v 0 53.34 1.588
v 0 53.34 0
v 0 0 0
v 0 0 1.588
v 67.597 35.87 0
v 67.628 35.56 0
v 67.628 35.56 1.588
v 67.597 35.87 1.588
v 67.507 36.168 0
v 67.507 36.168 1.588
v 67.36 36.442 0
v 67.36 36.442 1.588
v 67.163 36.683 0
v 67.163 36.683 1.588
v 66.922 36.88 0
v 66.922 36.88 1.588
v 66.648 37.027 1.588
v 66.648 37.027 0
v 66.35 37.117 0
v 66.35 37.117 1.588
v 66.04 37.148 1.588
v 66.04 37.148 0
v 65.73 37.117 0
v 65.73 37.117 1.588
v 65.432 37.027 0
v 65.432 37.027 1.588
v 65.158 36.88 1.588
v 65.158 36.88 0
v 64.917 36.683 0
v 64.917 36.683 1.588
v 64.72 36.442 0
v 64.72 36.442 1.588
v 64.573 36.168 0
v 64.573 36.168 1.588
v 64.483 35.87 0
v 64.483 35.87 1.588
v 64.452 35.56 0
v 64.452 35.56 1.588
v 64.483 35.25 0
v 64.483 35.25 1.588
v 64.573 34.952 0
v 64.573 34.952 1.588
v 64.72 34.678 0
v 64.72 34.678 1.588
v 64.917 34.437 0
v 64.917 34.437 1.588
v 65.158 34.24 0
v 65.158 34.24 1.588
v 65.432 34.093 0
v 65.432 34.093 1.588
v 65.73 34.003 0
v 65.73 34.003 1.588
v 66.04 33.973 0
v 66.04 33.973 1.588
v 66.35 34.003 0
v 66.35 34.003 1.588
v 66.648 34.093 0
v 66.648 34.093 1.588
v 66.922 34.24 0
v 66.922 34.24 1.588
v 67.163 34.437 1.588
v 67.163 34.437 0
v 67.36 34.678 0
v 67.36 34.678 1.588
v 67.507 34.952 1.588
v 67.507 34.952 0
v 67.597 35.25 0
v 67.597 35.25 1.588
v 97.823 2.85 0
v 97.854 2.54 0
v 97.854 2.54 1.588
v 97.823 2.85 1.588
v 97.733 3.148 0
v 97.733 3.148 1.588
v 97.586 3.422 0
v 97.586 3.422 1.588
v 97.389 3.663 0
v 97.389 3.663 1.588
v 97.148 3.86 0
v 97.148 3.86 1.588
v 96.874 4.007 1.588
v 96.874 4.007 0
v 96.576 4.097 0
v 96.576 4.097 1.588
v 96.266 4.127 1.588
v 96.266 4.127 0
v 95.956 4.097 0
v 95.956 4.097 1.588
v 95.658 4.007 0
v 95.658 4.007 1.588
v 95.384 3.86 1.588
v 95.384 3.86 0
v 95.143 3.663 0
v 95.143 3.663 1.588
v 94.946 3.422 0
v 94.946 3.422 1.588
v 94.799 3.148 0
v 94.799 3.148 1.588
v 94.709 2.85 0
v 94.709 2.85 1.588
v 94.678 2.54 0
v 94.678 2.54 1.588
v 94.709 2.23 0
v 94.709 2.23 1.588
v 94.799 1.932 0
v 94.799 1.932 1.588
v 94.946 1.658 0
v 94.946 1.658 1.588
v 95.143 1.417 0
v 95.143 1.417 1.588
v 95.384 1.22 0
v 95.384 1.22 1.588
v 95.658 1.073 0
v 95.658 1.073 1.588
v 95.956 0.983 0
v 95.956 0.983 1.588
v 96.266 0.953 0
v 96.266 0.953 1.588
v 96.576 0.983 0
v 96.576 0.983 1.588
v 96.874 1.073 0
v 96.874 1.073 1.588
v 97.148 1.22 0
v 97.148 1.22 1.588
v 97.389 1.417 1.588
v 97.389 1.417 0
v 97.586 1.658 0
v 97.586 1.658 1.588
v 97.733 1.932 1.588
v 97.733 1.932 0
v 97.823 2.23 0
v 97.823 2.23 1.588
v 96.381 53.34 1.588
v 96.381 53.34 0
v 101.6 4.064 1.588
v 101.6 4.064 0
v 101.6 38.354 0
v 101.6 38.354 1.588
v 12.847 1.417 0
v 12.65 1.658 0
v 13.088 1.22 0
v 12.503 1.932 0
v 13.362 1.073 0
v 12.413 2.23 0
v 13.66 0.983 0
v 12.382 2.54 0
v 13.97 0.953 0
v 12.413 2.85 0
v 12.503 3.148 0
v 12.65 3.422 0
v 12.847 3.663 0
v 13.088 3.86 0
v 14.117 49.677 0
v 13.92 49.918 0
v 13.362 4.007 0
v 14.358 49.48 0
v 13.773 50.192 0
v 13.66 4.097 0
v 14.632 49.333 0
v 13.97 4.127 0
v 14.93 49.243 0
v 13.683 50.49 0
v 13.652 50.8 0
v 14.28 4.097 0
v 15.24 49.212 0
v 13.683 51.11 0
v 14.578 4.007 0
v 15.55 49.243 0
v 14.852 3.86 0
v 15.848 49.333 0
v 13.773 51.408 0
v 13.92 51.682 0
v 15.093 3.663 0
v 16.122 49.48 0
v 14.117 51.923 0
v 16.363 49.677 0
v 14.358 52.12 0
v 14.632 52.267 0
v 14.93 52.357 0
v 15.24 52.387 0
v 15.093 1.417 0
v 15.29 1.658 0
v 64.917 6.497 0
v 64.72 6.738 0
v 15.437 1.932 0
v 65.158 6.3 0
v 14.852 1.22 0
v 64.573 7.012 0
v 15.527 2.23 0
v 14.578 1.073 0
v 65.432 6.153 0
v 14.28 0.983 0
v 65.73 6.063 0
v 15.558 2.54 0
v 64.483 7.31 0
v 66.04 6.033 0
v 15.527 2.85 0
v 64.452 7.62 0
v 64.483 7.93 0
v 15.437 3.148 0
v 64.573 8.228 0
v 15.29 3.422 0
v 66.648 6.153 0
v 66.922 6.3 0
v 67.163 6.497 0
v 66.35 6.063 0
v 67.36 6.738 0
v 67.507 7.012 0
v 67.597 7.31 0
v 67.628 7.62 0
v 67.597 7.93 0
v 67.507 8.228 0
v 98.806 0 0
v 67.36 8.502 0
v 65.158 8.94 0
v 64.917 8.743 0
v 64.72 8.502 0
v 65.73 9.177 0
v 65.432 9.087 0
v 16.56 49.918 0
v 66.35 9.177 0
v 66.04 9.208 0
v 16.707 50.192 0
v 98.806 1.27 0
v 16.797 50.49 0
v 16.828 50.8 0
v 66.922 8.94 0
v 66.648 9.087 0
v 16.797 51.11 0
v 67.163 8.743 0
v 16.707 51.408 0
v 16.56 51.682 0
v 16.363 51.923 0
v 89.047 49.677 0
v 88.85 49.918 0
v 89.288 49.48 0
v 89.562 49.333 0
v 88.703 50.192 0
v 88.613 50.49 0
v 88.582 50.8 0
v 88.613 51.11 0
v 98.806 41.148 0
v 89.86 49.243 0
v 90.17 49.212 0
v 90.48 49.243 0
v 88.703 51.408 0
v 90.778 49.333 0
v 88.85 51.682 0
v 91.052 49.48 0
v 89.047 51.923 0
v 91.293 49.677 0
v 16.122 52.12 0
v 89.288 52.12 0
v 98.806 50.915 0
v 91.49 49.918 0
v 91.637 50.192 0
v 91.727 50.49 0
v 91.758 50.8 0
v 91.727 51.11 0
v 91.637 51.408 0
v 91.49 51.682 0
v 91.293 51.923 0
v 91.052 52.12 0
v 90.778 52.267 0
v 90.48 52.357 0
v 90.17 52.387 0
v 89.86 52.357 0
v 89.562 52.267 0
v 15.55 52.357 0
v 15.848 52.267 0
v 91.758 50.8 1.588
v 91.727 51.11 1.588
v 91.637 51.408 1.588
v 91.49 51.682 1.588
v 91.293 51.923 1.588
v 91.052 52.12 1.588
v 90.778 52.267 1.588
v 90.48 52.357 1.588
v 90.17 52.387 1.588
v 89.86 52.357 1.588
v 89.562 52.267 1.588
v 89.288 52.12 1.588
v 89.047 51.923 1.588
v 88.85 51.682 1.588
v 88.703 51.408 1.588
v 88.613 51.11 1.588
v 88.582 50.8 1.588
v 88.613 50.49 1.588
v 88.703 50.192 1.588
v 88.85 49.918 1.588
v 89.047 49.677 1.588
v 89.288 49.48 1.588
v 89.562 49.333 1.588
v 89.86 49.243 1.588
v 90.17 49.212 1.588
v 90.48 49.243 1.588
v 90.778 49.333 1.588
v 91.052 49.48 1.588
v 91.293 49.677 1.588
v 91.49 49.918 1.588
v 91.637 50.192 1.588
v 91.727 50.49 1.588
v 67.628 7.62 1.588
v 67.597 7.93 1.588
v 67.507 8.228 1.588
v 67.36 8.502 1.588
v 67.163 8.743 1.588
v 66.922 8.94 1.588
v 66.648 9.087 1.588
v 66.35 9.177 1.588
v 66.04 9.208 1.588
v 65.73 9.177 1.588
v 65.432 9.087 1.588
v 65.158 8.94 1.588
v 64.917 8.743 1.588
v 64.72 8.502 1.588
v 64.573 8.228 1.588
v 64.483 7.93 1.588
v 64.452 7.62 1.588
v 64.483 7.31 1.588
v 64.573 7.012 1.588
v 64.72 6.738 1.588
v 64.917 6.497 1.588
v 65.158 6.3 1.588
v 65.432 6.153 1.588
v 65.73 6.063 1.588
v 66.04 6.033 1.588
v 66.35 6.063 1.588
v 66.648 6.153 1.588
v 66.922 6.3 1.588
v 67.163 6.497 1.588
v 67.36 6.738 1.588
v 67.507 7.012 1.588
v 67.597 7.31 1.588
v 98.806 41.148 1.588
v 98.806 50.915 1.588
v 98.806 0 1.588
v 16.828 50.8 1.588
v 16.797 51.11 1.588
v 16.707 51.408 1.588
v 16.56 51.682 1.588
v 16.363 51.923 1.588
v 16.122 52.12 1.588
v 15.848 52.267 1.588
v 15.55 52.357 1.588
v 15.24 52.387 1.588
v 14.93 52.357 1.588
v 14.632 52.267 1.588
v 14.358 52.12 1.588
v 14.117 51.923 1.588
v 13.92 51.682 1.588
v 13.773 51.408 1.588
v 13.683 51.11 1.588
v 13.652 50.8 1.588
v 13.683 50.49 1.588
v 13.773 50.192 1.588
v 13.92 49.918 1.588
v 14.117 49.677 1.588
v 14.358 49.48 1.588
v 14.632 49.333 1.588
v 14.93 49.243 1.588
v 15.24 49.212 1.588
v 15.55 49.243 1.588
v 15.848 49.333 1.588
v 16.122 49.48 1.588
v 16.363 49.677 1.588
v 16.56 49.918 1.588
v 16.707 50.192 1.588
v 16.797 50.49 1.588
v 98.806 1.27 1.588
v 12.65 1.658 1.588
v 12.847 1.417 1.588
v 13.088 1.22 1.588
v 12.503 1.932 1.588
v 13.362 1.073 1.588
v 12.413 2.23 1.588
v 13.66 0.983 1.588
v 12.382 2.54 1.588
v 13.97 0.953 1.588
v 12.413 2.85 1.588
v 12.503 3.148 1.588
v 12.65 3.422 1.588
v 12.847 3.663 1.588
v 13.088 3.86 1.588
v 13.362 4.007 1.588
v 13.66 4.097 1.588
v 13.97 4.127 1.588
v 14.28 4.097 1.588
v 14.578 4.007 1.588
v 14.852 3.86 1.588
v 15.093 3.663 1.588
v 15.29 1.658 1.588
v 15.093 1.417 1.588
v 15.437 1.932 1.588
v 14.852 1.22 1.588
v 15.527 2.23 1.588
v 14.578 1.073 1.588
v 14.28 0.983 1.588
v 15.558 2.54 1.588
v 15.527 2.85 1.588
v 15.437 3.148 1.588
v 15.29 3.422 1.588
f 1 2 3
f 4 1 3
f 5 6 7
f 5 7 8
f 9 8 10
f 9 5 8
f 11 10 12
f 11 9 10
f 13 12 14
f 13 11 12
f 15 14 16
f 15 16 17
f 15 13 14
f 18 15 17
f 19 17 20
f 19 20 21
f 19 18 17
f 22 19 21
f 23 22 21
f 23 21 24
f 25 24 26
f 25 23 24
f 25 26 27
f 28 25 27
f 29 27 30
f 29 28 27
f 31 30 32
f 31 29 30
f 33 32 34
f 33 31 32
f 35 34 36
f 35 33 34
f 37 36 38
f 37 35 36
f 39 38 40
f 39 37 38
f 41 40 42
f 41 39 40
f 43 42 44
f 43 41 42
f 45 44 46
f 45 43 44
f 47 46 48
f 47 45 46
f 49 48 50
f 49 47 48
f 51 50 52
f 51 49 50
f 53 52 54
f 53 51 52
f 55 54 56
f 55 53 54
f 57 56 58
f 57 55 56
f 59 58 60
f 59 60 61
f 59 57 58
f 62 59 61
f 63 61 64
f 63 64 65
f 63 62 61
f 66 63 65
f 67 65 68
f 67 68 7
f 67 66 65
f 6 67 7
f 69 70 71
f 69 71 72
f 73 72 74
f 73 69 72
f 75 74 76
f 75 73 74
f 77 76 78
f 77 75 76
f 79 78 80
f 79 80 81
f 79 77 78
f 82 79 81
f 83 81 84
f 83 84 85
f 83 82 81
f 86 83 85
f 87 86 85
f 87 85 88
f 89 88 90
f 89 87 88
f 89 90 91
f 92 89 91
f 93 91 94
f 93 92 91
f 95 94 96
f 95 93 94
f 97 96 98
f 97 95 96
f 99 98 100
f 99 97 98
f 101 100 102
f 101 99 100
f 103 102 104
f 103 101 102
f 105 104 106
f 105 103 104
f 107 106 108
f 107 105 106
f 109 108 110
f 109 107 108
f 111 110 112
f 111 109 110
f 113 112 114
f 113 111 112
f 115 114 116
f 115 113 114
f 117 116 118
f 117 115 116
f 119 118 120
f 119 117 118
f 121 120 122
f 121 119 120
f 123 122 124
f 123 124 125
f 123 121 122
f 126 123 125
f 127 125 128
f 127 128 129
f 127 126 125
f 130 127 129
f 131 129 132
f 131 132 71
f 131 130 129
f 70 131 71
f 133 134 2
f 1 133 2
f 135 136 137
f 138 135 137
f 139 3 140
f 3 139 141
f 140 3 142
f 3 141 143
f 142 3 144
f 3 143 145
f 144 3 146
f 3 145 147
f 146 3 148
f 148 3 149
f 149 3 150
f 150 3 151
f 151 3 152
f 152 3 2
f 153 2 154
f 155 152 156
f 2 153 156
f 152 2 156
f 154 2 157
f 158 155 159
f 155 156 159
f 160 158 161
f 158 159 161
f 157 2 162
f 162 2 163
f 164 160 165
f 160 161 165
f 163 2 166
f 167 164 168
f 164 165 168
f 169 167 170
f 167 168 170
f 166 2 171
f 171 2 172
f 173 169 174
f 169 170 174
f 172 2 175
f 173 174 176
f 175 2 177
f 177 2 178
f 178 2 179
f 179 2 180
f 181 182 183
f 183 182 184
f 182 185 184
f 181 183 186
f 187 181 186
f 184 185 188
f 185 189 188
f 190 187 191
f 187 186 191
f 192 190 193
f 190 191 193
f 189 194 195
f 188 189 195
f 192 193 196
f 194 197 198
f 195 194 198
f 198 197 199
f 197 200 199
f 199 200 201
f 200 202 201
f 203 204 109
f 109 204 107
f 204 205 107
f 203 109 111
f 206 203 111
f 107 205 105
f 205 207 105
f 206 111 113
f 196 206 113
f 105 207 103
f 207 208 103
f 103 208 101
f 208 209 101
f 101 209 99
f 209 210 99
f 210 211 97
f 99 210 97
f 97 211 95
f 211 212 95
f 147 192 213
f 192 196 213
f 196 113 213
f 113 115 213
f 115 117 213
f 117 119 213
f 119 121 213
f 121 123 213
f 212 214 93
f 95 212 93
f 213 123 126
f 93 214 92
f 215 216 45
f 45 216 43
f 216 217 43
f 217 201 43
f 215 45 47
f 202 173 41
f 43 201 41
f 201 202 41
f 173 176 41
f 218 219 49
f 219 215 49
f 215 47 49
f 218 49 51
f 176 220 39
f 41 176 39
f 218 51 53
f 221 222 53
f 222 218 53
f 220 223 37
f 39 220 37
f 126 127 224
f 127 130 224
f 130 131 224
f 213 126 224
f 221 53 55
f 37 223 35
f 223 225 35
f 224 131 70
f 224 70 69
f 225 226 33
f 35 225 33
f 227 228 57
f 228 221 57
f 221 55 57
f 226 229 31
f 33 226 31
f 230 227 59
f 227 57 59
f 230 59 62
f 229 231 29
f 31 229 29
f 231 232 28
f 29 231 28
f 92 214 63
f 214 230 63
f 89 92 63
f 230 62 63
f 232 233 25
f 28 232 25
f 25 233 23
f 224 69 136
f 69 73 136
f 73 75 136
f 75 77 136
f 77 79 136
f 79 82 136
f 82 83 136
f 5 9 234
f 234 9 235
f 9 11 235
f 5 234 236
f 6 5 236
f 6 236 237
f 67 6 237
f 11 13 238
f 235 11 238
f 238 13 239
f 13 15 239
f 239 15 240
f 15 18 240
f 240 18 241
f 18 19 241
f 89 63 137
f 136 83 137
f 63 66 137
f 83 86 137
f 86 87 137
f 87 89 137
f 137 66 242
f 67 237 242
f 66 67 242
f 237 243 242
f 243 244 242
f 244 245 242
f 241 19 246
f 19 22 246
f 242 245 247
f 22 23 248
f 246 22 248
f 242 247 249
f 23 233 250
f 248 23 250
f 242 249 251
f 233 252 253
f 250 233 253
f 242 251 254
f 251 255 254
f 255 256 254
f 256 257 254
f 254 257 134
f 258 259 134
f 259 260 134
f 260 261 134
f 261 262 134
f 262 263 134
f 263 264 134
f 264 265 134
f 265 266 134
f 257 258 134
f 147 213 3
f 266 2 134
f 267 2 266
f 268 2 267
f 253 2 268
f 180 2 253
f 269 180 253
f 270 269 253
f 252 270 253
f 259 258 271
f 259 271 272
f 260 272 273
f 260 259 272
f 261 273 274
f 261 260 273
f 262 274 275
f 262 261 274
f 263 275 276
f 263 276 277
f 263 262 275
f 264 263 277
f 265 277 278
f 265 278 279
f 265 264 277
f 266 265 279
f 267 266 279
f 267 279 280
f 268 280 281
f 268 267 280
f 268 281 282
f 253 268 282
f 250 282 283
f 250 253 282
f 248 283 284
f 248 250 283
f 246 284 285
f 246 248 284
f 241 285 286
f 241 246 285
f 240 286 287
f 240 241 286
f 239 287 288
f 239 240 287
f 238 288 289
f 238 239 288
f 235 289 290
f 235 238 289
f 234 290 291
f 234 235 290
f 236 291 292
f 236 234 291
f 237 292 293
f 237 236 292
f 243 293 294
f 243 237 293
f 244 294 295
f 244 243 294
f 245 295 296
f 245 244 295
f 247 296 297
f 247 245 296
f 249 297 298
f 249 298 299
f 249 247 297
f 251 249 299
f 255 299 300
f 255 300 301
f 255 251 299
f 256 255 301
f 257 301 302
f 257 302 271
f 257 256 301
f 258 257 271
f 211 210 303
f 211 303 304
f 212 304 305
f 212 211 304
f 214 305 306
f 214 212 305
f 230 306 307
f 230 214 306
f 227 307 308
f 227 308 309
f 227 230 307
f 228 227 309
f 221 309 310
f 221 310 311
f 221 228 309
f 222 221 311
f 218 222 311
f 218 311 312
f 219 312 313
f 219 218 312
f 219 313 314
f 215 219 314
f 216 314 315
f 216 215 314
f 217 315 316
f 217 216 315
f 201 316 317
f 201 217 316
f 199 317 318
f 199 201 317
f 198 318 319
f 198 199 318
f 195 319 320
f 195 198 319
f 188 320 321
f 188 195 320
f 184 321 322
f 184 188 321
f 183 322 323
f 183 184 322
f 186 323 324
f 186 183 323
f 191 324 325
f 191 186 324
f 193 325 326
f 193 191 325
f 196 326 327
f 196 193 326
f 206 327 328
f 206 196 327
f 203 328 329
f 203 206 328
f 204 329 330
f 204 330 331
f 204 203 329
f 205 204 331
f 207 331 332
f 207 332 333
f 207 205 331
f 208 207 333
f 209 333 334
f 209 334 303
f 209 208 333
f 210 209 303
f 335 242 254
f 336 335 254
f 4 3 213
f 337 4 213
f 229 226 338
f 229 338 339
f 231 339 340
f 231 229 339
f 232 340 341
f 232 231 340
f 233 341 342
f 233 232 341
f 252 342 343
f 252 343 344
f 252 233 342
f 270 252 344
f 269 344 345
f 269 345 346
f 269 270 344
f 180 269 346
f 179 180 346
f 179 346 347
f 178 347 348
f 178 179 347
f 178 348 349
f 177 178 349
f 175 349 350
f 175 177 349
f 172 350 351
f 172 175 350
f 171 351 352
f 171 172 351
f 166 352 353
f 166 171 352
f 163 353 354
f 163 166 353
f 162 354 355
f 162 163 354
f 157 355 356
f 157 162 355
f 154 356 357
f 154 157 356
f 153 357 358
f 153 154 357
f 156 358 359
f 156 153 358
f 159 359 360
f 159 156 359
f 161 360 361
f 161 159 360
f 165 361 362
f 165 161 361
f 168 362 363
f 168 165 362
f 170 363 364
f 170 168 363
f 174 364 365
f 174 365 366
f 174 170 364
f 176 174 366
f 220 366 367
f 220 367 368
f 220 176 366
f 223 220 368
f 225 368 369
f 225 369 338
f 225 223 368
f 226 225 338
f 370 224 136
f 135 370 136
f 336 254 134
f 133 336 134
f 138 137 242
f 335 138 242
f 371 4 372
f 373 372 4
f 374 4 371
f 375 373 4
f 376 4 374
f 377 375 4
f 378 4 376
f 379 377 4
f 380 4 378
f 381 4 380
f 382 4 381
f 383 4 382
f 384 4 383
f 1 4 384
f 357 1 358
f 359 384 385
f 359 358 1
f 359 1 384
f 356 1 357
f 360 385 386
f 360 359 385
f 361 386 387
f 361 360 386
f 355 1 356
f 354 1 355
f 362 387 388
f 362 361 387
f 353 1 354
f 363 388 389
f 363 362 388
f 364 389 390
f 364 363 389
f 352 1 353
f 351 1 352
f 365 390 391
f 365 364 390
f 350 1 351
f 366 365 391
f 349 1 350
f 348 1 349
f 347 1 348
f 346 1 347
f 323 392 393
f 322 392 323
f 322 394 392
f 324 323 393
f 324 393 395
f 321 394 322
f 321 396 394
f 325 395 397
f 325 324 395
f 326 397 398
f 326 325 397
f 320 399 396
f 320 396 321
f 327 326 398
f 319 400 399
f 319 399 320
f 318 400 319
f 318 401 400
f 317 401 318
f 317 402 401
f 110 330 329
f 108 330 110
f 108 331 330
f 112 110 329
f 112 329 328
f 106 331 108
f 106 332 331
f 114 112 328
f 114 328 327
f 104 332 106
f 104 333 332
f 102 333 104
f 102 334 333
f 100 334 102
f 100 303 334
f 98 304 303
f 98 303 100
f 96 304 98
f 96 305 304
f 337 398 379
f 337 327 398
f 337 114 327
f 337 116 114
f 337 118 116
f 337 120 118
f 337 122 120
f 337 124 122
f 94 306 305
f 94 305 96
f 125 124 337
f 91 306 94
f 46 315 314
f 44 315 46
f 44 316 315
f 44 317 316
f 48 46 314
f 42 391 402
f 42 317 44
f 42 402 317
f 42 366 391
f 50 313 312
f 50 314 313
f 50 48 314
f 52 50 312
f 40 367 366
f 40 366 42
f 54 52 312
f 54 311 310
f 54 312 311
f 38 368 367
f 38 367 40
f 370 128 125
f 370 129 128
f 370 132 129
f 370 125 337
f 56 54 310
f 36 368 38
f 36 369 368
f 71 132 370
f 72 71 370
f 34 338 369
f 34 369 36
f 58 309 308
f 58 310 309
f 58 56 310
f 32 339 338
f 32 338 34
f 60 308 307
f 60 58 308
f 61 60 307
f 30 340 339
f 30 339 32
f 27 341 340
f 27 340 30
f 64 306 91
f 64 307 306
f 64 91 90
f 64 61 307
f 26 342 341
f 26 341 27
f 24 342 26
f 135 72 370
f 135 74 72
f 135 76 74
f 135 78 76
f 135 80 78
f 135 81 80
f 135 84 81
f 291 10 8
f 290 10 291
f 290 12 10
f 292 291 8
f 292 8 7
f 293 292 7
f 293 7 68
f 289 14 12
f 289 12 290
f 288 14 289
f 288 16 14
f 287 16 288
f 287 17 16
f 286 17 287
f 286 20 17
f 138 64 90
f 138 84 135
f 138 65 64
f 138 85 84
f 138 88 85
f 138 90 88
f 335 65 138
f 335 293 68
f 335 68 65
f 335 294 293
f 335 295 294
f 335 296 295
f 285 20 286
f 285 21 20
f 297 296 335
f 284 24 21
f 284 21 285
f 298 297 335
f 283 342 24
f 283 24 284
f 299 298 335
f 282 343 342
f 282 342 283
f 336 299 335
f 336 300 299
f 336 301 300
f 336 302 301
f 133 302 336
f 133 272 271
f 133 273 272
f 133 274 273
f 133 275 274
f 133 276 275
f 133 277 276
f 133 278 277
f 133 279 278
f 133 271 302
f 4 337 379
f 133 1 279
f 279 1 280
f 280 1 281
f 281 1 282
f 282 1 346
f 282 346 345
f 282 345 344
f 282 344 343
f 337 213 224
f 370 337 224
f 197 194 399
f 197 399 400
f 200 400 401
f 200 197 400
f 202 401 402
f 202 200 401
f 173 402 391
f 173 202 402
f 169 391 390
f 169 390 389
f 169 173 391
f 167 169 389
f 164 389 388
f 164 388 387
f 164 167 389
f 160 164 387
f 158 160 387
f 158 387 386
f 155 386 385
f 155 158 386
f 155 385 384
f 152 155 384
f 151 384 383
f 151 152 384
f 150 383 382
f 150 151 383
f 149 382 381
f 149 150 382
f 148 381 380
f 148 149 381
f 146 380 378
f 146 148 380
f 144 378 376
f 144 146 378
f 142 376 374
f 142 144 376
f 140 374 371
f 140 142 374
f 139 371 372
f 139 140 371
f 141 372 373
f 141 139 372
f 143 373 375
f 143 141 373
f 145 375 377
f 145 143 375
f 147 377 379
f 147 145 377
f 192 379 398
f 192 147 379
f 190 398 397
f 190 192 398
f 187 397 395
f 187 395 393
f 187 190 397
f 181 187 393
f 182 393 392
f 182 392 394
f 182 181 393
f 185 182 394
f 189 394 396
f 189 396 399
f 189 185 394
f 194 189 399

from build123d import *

# Parameters (mm, degrees)
SKETCH1_R           = 1.5875
BOSS_EXTRUDE1_DEPTH = 1.5875


with BuildPart() as part:
    # Sketch1 → Boss-Extrude1 (new body)
    with BuildSketch(Plane.XY):
        Polygon((0, 53.34), (0, 0), (98.806, 0), (98.806, 1.27), (101.6, 4.064), (101.6, 38.354), (98.806, 41.148), (98.806, 50.915330847), (96.381330847, 53.34), align=None)
        with Locations((13.97, 2.54)):
            Circle(SKETCH1_R, mode=Mode.SUBTRACT)
        with Locations((66.04, 7.62)):
            Circle(SKETCH1_R, mode=Mode.SUBTRACT)
        with Locations((96.266, 2.54)):
            Circle(SKETCH1_R, mode=Mode.SUBTRACT)
        with Locations((15.24, 50.8)):
            Circle(SKETCH1_R, mode=Mode.SUBTRACT)
        with Locations((66.04, 35.56)):
            Circle(SKETCH1_R, mode=Mode.SUBTRACT)
        with Locations((90.17, 50.8)):
            Circle(SKETCH1_R, mode=Mode.SUBTRACT)
    extrude(amount=BOSS_EXTRUDE1_DEPTH)


solid = part.part
